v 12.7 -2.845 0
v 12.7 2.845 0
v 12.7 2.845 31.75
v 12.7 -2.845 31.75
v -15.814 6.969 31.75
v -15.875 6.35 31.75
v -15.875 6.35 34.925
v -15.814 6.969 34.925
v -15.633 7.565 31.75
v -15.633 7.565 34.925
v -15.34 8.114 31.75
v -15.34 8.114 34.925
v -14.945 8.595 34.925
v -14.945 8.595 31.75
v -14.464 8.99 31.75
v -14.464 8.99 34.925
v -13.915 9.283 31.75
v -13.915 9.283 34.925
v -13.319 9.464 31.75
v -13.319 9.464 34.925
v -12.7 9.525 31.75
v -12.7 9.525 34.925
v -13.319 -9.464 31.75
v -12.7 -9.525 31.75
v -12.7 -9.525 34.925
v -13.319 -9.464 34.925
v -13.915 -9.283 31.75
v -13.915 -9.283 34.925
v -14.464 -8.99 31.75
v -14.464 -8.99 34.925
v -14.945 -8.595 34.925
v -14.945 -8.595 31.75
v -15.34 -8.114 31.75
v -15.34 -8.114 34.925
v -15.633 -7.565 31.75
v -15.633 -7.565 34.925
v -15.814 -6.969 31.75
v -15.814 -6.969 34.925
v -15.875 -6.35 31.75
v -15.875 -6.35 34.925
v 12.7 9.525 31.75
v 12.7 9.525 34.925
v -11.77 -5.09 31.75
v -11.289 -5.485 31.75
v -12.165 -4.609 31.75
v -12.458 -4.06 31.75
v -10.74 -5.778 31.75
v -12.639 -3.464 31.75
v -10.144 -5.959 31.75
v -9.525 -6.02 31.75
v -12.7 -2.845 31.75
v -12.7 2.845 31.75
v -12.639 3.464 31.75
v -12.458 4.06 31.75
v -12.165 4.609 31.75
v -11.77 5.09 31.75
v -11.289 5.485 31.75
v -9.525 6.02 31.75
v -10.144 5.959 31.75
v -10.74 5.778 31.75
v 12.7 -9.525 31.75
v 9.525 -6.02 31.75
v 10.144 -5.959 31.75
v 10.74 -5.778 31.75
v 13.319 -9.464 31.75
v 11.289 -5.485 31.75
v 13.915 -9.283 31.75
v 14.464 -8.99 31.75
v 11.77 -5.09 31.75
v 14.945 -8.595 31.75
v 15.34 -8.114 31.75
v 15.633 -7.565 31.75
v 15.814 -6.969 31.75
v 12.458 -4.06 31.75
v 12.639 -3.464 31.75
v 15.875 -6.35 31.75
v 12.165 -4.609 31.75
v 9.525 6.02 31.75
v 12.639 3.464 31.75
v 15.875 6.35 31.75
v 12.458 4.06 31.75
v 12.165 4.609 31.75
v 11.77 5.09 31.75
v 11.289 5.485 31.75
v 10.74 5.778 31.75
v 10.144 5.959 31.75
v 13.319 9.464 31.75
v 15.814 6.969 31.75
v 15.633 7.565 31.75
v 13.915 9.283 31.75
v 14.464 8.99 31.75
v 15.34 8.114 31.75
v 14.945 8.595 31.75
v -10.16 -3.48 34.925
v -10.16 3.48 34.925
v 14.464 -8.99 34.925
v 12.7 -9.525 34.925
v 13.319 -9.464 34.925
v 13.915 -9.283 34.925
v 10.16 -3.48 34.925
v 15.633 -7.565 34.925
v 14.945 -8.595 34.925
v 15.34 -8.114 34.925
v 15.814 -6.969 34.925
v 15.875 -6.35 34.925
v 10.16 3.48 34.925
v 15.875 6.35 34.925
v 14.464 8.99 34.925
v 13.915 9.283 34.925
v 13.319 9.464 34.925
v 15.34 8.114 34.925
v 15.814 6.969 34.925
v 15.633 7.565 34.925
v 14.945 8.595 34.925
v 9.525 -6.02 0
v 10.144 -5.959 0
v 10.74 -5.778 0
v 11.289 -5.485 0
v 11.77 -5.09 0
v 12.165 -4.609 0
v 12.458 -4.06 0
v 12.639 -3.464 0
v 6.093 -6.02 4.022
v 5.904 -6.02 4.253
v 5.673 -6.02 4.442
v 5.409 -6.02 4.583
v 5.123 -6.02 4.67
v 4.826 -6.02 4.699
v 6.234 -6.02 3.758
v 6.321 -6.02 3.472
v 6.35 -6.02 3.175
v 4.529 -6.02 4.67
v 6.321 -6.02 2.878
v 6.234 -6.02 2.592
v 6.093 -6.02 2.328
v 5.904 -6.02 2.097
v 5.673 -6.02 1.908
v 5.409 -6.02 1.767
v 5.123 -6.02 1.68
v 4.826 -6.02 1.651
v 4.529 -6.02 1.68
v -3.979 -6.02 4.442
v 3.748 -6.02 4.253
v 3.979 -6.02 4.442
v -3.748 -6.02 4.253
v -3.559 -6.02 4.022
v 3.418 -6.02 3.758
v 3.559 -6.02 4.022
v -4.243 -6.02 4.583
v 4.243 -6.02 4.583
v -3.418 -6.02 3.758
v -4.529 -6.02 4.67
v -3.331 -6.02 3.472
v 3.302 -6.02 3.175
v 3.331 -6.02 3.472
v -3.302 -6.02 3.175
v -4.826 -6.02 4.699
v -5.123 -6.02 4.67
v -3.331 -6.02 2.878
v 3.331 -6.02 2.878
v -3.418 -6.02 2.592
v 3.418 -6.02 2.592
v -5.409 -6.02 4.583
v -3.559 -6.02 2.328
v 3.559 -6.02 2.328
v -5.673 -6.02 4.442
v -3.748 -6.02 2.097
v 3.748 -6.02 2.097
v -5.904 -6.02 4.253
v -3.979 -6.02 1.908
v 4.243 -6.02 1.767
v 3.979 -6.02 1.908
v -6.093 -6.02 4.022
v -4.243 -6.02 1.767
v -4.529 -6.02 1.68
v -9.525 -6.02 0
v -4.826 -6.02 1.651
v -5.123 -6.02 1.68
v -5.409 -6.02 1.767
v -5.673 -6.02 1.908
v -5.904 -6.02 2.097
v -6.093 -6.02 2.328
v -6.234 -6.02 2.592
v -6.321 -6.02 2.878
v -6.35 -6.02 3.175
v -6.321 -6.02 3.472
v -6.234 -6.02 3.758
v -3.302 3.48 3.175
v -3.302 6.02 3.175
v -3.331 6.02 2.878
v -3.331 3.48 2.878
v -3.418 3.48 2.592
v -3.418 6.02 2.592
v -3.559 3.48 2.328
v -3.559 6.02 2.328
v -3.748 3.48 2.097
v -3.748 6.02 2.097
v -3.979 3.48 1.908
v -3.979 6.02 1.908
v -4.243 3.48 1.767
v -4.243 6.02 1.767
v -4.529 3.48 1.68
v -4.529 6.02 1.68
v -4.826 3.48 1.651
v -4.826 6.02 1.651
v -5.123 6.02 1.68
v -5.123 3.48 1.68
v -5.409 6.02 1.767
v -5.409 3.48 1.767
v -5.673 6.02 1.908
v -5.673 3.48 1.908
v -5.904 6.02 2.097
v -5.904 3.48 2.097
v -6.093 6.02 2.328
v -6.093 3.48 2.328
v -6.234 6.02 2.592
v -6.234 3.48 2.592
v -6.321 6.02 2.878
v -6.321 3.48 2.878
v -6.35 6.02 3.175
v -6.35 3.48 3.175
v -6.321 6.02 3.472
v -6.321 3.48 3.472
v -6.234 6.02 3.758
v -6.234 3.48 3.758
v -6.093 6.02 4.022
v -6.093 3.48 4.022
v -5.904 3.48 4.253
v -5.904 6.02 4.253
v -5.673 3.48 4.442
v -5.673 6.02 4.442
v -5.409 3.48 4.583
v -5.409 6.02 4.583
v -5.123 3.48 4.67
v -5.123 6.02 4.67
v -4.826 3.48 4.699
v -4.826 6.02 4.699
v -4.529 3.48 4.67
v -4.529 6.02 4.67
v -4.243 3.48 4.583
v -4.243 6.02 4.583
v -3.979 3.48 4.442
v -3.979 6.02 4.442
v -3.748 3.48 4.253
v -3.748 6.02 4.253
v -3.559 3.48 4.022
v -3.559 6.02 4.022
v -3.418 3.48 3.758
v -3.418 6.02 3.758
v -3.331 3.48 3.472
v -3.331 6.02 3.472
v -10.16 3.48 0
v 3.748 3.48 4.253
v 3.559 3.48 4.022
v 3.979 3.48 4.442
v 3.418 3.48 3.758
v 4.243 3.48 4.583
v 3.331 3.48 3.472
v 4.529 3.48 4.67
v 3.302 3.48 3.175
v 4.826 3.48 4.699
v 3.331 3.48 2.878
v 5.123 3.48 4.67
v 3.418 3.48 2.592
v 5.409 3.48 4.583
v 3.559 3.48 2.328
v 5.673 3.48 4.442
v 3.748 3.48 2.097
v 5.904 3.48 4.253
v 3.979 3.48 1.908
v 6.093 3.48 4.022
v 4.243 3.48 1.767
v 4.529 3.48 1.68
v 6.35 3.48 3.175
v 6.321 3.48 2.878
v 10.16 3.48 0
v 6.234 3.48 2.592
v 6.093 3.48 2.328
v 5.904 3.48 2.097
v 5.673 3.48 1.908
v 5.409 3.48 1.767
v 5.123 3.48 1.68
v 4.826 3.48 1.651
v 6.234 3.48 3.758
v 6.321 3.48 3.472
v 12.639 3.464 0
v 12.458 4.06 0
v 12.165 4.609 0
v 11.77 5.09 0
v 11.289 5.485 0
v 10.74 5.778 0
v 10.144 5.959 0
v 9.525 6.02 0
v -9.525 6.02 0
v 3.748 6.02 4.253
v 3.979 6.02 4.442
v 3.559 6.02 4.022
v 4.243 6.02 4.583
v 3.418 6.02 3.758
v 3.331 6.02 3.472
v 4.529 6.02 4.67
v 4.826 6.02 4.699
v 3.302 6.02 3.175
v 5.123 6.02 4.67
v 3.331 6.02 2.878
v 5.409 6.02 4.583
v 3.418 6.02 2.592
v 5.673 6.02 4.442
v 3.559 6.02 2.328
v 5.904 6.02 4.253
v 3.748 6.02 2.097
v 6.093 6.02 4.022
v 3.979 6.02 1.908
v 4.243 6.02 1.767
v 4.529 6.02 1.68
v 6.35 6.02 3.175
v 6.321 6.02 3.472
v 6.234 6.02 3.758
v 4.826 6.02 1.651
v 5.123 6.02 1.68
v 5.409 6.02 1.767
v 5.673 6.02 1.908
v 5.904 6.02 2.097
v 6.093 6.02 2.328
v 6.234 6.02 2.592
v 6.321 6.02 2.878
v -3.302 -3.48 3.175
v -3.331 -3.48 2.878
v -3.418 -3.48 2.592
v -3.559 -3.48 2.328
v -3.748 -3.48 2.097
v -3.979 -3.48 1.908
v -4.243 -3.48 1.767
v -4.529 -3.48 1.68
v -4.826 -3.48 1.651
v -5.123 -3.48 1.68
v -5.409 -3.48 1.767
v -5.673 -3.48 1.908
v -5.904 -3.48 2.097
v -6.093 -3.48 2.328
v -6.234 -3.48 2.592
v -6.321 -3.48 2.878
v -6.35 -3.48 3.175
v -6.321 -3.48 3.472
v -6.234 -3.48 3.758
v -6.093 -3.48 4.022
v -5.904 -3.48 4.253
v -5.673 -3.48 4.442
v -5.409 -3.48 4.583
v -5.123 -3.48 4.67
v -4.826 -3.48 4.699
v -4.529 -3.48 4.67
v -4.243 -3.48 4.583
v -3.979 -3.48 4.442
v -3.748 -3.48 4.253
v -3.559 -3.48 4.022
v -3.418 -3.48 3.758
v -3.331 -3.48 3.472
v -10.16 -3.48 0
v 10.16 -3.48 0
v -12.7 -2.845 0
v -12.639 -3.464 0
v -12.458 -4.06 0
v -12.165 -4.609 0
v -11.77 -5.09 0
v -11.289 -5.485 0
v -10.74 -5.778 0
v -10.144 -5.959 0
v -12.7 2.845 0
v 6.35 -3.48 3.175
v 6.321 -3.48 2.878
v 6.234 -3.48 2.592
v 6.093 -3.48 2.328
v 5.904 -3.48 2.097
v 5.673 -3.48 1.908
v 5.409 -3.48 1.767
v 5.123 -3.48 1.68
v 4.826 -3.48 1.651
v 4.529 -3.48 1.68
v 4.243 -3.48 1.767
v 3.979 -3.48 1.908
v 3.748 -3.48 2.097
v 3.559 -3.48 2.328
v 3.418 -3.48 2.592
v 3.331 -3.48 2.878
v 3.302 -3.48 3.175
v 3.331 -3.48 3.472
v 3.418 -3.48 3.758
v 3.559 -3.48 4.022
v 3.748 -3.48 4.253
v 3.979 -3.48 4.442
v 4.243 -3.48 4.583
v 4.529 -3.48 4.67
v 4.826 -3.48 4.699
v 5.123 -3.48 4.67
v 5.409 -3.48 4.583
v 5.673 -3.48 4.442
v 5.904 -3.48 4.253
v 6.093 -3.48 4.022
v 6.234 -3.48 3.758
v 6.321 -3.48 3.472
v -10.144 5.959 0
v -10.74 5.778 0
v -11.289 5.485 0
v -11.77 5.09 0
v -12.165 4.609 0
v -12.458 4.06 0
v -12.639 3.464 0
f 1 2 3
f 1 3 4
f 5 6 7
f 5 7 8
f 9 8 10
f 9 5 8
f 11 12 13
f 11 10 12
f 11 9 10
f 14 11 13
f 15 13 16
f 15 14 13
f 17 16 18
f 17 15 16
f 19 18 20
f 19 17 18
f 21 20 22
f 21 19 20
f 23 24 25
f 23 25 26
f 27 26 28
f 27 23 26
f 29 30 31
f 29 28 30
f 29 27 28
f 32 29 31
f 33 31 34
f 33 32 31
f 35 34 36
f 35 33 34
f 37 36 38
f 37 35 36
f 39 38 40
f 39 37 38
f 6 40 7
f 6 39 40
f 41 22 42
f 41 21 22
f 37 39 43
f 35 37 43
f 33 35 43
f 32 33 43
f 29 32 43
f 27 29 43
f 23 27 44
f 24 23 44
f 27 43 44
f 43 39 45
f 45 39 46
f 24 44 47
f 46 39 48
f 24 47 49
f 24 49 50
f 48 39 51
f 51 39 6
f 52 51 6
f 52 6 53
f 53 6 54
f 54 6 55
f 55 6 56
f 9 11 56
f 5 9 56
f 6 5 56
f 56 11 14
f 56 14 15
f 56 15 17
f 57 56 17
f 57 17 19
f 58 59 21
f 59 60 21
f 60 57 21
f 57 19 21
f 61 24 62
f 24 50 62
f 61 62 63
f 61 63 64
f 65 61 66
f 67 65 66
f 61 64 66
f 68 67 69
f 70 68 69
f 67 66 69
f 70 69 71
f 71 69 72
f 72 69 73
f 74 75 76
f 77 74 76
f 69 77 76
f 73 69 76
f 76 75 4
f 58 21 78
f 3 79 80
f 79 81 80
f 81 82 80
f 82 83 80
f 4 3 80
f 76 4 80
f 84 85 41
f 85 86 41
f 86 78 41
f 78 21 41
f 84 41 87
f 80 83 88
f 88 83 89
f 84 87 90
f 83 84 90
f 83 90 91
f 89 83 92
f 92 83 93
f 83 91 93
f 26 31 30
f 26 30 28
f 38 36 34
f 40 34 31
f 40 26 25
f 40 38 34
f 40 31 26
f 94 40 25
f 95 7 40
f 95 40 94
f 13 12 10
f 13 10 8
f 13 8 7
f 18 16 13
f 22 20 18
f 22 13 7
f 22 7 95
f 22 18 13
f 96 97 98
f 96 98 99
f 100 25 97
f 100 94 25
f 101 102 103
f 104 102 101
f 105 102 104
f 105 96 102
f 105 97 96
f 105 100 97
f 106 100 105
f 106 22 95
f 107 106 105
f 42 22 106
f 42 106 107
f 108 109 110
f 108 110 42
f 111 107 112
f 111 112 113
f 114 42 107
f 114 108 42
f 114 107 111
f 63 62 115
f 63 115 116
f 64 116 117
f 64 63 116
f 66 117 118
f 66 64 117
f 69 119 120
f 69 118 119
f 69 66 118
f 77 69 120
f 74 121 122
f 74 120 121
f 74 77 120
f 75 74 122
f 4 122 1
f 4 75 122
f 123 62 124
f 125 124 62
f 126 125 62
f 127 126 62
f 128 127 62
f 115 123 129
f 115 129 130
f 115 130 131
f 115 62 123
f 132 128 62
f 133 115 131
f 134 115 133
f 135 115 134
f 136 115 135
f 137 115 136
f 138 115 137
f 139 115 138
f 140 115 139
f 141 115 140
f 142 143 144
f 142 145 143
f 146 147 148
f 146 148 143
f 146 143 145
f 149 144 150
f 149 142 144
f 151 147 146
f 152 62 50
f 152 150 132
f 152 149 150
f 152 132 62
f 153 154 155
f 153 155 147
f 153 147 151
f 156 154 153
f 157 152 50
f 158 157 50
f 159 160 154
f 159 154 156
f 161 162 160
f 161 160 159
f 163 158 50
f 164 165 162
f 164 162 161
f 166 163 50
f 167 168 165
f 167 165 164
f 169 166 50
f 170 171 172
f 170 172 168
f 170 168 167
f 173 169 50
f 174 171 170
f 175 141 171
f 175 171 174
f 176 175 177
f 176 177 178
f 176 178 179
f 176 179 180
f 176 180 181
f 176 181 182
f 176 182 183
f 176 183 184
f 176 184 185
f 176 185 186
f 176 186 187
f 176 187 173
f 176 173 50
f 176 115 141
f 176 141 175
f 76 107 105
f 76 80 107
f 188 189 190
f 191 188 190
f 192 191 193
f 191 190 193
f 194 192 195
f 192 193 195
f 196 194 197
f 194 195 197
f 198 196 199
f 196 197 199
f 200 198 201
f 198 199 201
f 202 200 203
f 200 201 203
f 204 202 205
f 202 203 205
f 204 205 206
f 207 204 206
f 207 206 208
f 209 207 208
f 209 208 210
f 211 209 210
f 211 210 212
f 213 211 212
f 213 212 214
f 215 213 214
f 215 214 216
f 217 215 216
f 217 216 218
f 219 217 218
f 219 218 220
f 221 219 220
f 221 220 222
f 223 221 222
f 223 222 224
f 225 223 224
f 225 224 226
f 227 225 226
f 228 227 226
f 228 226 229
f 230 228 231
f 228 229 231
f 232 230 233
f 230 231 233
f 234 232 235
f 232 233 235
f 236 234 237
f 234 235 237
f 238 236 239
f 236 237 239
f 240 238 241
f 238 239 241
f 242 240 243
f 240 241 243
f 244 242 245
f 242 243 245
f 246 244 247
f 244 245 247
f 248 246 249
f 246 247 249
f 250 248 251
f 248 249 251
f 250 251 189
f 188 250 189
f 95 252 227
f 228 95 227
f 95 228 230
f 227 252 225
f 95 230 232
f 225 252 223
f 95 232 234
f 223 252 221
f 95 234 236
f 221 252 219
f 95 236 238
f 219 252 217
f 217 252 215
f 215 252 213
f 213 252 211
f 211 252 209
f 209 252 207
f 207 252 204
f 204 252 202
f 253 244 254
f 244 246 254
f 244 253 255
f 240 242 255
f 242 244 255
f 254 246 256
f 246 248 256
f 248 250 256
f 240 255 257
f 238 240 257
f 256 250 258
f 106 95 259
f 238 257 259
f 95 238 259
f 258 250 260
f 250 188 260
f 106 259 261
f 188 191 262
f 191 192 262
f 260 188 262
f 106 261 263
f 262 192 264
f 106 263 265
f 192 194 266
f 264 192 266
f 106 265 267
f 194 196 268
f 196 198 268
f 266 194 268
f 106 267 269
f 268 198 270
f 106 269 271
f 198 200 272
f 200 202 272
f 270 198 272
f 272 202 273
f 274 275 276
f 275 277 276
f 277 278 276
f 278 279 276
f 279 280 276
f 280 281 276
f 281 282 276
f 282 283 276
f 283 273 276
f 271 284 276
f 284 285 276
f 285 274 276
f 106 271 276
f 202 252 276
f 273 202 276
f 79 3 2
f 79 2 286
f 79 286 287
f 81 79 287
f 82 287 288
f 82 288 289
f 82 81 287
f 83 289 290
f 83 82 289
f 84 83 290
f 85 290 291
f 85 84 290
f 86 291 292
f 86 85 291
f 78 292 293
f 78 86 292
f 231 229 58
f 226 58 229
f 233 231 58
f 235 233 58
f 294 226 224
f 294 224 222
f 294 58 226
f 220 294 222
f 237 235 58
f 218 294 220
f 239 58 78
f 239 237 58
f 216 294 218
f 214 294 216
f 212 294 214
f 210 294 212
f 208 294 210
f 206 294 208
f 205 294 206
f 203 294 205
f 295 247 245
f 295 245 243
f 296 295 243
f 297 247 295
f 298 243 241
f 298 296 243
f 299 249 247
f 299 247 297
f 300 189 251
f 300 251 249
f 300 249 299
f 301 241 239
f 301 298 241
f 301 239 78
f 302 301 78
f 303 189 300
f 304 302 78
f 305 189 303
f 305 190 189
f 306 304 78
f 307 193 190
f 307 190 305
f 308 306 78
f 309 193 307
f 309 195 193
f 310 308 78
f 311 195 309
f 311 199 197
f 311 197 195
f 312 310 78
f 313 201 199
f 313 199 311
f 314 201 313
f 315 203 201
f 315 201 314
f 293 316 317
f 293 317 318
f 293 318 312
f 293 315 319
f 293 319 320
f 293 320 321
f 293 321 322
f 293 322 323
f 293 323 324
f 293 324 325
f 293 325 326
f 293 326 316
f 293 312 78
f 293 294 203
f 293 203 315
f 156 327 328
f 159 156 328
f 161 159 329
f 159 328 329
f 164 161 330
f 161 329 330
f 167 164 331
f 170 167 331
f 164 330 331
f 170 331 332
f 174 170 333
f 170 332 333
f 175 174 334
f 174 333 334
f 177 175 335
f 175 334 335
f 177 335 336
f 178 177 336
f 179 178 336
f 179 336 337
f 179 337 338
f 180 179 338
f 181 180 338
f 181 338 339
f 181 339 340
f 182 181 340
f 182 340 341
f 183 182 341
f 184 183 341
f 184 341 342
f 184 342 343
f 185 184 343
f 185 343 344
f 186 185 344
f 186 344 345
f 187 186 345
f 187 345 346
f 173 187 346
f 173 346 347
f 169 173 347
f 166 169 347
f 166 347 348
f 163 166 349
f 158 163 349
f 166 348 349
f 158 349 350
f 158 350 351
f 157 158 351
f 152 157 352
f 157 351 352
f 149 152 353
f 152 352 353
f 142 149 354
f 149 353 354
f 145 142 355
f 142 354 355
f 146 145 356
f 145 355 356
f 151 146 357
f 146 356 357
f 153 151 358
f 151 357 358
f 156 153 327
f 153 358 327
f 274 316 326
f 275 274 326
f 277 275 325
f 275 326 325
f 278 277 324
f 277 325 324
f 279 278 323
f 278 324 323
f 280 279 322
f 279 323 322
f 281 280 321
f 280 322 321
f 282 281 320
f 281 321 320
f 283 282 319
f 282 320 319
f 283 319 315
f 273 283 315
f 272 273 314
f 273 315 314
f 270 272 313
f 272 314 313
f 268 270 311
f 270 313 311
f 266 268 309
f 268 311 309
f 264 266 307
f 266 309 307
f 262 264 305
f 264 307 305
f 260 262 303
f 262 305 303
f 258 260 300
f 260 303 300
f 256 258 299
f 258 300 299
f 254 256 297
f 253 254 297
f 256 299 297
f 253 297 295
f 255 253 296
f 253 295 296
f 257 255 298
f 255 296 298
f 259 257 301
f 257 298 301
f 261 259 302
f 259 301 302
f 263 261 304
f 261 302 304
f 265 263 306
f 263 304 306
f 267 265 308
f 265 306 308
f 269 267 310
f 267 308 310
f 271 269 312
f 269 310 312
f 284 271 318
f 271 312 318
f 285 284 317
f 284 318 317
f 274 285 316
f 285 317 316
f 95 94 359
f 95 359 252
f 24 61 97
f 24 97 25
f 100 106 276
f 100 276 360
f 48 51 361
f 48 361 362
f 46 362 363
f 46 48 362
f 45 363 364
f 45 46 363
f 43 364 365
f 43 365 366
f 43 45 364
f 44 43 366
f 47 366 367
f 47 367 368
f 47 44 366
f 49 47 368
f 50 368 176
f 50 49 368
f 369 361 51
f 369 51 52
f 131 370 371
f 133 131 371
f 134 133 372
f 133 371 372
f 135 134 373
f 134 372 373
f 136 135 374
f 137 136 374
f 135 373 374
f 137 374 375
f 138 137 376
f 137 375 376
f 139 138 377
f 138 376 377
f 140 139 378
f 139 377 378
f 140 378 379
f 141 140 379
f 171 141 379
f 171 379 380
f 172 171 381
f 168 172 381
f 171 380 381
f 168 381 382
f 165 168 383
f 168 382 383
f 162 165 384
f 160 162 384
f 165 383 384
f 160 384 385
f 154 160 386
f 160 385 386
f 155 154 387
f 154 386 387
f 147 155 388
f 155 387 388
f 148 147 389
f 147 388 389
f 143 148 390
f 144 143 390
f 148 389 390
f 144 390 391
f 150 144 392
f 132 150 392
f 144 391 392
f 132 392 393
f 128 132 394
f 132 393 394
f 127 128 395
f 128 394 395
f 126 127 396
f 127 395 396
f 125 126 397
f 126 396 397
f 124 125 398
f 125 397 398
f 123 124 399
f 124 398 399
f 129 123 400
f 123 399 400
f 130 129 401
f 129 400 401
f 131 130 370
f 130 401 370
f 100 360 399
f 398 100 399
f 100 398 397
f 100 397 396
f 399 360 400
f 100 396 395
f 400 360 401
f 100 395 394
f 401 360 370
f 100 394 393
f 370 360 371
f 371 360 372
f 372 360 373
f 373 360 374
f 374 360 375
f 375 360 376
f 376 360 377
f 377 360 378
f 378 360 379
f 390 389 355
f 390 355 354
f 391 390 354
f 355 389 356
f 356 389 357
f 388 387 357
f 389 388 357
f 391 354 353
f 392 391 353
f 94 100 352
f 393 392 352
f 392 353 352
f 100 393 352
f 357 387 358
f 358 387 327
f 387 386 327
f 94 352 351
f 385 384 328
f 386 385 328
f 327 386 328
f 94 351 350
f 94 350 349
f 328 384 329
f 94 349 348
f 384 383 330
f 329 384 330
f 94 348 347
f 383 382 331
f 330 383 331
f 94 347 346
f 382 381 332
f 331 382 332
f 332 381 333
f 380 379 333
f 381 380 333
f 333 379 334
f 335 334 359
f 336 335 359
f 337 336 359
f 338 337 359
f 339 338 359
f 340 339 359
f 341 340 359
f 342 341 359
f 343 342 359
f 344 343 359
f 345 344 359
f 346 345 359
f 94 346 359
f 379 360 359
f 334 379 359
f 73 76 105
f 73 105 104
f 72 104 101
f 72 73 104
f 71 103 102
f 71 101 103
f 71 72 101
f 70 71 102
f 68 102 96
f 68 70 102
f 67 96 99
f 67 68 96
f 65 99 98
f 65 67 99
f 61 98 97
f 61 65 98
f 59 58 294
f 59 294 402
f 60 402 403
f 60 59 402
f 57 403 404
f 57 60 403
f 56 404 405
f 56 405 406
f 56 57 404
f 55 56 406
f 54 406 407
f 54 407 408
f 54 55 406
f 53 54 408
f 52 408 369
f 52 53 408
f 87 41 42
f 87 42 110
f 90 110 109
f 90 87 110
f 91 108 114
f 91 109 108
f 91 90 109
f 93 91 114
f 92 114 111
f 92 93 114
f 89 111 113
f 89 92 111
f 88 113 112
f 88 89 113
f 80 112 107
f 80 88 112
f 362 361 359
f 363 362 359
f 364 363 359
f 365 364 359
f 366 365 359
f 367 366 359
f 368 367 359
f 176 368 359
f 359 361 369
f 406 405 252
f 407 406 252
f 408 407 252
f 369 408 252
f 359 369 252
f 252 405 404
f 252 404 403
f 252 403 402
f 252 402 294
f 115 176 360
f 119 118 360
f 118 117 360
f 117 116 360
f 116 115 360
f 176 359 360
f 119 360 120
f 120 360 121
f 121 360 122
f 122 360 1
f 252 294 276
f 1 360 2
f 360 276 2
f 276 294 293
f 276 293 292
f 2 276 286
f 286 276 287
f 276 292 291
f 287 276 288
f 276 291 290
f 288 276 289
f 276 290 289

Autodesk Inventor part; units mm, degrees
ref_plane "YZ Plane" through (0, 0, 0) normal (1, 0, 0) x (0, 1, 0)
ref_plane "XZ Plane" through (0, 0, 0) normal (0, 1, 0) x (-1, 0, 0)
ref_plane "XY Plane" through (0, 0, 0) normal (0, 0, 1) x (1, 0, 0)
sketch "Sketch1" plane through (0, 0, 0) normal (0, 0, 1) x (1, 0, 0)
  line L0 (12.7, -6.0198) -> (-12.7, -6.0198)
  line L1 (-12.7, -6.0198) -> (-12.7, 6.0198)
  line L2 (-12.7, 6.0198) -> (12.7, 6.0198)
  line L3 (12.7, 6.0198) -> (12.7, -6.0198)
  line L4 (12.7, -6.0198) -> (-12.7, 6.0198) construction
  line L5 (-12.7, -6.0198) -> (12.7, 6.0198) construction
  point P0 (0, 0)
  dimension "d0" = 25.4
  dimension "d1" = 12.0396
extrude "Extrusion1" add sketch "Sketch1" along normal blind 31.75
shell "Shell1" thickness 2.54 removed faces 2 at (4.2333, -2.0066, 0) at (4.2333, -2.0066, 31.75)
sketch "Sketch2" plane through (-12.7, 6.0198, 0) normal (0, 1, 0) x (1, 0, 0)
  line L0 (-2.1226, -3.175) -> (30.0619, -3.175)
  line L1 (0, 0) -> (25.4, 0) projected
  circle A0 centre (7.874, -3.175) radius 1.524
  circle A1 centre (17.526, -3.175) radius 1.524
  line L2 (12.7, 1.1779) -> (12.7, -16.2415)
  point P0 (12.7, 0)
  point P1 (12.7, 0)
  dimension "d23" = 3.175
  dimension "d24" = 3.048
  dimension "d25" = 9.652
extrude "Extrusion2" cut sketch "Sketch2" against normal through all
sketch "Sketch3" plane through (0, 0, 31.75) normal (0, 0, 1) x (1, 0, 0)
  line L0 (-10.16, 3.4798) -> (10.16, 3.4798)
  line L1 (10.16, 3.4798) -> (10.16, -3.4798)
  line L2 (10.16, -3.4798) -> (-10.16, -3.4798)
  line L3 (-10.16, -3.4798) -> (-10.16, 3.4798)
  line L4 (-10.16, 3.4798) -> (10.16, -3.4798) construction
  line L5 (10.16, 3.4798) -> (-10.16, -3.4798) construction
  line L6 (-12.7, 9.525) -> (12.7, 9.525)
  line L7 (15.875, 6.35) -> (15.875, -6.35)
  line L8 (12.7, -9.525) -> (-12.7, -9.525)
  line L9 (-15.875, -6.35) -> (-15.875, 6.35)
  line L10 (-15.875, 9.525) -> (15.875, -9.525) construction
  line L11 (15.875, 9.525) -> (-15.875, -9.525) construction
  arc A0 (12.7, -9.525) -> (15.875, -6.35) centre (12.7, -6.35) ccw
  arc A1 (15.875, 6.35) -> (12.7, 9.525) centre (12.7, 6.35) ccw
  arc A2 (-12.7, 9.525) -> (-15.875, 6.35) centre (-12.7, 6.35) ccw
  arc A3 (-15.875, -6.35) -> (-12.7, -9.525) centre (-12.7, -6.35) ccw
  point P0 (0, 0)
  dimension "d28" = 19.05
  dimension "d29" = 31.75
  dimension "d30" = 3.175
extrude "Extrusion3" add sketch "Sketch3" along normal blind 3.175
fillet "Fillet1" radius 3.175 4 edges at (12.7, 6.0198, 15.875) (12.7, -6.0198, 15.875) (-12.7, 6.0198, 15.875) (-12.7, -6.0198, 15.875)
properties part number "E-Stop_Fixture_Taller"
